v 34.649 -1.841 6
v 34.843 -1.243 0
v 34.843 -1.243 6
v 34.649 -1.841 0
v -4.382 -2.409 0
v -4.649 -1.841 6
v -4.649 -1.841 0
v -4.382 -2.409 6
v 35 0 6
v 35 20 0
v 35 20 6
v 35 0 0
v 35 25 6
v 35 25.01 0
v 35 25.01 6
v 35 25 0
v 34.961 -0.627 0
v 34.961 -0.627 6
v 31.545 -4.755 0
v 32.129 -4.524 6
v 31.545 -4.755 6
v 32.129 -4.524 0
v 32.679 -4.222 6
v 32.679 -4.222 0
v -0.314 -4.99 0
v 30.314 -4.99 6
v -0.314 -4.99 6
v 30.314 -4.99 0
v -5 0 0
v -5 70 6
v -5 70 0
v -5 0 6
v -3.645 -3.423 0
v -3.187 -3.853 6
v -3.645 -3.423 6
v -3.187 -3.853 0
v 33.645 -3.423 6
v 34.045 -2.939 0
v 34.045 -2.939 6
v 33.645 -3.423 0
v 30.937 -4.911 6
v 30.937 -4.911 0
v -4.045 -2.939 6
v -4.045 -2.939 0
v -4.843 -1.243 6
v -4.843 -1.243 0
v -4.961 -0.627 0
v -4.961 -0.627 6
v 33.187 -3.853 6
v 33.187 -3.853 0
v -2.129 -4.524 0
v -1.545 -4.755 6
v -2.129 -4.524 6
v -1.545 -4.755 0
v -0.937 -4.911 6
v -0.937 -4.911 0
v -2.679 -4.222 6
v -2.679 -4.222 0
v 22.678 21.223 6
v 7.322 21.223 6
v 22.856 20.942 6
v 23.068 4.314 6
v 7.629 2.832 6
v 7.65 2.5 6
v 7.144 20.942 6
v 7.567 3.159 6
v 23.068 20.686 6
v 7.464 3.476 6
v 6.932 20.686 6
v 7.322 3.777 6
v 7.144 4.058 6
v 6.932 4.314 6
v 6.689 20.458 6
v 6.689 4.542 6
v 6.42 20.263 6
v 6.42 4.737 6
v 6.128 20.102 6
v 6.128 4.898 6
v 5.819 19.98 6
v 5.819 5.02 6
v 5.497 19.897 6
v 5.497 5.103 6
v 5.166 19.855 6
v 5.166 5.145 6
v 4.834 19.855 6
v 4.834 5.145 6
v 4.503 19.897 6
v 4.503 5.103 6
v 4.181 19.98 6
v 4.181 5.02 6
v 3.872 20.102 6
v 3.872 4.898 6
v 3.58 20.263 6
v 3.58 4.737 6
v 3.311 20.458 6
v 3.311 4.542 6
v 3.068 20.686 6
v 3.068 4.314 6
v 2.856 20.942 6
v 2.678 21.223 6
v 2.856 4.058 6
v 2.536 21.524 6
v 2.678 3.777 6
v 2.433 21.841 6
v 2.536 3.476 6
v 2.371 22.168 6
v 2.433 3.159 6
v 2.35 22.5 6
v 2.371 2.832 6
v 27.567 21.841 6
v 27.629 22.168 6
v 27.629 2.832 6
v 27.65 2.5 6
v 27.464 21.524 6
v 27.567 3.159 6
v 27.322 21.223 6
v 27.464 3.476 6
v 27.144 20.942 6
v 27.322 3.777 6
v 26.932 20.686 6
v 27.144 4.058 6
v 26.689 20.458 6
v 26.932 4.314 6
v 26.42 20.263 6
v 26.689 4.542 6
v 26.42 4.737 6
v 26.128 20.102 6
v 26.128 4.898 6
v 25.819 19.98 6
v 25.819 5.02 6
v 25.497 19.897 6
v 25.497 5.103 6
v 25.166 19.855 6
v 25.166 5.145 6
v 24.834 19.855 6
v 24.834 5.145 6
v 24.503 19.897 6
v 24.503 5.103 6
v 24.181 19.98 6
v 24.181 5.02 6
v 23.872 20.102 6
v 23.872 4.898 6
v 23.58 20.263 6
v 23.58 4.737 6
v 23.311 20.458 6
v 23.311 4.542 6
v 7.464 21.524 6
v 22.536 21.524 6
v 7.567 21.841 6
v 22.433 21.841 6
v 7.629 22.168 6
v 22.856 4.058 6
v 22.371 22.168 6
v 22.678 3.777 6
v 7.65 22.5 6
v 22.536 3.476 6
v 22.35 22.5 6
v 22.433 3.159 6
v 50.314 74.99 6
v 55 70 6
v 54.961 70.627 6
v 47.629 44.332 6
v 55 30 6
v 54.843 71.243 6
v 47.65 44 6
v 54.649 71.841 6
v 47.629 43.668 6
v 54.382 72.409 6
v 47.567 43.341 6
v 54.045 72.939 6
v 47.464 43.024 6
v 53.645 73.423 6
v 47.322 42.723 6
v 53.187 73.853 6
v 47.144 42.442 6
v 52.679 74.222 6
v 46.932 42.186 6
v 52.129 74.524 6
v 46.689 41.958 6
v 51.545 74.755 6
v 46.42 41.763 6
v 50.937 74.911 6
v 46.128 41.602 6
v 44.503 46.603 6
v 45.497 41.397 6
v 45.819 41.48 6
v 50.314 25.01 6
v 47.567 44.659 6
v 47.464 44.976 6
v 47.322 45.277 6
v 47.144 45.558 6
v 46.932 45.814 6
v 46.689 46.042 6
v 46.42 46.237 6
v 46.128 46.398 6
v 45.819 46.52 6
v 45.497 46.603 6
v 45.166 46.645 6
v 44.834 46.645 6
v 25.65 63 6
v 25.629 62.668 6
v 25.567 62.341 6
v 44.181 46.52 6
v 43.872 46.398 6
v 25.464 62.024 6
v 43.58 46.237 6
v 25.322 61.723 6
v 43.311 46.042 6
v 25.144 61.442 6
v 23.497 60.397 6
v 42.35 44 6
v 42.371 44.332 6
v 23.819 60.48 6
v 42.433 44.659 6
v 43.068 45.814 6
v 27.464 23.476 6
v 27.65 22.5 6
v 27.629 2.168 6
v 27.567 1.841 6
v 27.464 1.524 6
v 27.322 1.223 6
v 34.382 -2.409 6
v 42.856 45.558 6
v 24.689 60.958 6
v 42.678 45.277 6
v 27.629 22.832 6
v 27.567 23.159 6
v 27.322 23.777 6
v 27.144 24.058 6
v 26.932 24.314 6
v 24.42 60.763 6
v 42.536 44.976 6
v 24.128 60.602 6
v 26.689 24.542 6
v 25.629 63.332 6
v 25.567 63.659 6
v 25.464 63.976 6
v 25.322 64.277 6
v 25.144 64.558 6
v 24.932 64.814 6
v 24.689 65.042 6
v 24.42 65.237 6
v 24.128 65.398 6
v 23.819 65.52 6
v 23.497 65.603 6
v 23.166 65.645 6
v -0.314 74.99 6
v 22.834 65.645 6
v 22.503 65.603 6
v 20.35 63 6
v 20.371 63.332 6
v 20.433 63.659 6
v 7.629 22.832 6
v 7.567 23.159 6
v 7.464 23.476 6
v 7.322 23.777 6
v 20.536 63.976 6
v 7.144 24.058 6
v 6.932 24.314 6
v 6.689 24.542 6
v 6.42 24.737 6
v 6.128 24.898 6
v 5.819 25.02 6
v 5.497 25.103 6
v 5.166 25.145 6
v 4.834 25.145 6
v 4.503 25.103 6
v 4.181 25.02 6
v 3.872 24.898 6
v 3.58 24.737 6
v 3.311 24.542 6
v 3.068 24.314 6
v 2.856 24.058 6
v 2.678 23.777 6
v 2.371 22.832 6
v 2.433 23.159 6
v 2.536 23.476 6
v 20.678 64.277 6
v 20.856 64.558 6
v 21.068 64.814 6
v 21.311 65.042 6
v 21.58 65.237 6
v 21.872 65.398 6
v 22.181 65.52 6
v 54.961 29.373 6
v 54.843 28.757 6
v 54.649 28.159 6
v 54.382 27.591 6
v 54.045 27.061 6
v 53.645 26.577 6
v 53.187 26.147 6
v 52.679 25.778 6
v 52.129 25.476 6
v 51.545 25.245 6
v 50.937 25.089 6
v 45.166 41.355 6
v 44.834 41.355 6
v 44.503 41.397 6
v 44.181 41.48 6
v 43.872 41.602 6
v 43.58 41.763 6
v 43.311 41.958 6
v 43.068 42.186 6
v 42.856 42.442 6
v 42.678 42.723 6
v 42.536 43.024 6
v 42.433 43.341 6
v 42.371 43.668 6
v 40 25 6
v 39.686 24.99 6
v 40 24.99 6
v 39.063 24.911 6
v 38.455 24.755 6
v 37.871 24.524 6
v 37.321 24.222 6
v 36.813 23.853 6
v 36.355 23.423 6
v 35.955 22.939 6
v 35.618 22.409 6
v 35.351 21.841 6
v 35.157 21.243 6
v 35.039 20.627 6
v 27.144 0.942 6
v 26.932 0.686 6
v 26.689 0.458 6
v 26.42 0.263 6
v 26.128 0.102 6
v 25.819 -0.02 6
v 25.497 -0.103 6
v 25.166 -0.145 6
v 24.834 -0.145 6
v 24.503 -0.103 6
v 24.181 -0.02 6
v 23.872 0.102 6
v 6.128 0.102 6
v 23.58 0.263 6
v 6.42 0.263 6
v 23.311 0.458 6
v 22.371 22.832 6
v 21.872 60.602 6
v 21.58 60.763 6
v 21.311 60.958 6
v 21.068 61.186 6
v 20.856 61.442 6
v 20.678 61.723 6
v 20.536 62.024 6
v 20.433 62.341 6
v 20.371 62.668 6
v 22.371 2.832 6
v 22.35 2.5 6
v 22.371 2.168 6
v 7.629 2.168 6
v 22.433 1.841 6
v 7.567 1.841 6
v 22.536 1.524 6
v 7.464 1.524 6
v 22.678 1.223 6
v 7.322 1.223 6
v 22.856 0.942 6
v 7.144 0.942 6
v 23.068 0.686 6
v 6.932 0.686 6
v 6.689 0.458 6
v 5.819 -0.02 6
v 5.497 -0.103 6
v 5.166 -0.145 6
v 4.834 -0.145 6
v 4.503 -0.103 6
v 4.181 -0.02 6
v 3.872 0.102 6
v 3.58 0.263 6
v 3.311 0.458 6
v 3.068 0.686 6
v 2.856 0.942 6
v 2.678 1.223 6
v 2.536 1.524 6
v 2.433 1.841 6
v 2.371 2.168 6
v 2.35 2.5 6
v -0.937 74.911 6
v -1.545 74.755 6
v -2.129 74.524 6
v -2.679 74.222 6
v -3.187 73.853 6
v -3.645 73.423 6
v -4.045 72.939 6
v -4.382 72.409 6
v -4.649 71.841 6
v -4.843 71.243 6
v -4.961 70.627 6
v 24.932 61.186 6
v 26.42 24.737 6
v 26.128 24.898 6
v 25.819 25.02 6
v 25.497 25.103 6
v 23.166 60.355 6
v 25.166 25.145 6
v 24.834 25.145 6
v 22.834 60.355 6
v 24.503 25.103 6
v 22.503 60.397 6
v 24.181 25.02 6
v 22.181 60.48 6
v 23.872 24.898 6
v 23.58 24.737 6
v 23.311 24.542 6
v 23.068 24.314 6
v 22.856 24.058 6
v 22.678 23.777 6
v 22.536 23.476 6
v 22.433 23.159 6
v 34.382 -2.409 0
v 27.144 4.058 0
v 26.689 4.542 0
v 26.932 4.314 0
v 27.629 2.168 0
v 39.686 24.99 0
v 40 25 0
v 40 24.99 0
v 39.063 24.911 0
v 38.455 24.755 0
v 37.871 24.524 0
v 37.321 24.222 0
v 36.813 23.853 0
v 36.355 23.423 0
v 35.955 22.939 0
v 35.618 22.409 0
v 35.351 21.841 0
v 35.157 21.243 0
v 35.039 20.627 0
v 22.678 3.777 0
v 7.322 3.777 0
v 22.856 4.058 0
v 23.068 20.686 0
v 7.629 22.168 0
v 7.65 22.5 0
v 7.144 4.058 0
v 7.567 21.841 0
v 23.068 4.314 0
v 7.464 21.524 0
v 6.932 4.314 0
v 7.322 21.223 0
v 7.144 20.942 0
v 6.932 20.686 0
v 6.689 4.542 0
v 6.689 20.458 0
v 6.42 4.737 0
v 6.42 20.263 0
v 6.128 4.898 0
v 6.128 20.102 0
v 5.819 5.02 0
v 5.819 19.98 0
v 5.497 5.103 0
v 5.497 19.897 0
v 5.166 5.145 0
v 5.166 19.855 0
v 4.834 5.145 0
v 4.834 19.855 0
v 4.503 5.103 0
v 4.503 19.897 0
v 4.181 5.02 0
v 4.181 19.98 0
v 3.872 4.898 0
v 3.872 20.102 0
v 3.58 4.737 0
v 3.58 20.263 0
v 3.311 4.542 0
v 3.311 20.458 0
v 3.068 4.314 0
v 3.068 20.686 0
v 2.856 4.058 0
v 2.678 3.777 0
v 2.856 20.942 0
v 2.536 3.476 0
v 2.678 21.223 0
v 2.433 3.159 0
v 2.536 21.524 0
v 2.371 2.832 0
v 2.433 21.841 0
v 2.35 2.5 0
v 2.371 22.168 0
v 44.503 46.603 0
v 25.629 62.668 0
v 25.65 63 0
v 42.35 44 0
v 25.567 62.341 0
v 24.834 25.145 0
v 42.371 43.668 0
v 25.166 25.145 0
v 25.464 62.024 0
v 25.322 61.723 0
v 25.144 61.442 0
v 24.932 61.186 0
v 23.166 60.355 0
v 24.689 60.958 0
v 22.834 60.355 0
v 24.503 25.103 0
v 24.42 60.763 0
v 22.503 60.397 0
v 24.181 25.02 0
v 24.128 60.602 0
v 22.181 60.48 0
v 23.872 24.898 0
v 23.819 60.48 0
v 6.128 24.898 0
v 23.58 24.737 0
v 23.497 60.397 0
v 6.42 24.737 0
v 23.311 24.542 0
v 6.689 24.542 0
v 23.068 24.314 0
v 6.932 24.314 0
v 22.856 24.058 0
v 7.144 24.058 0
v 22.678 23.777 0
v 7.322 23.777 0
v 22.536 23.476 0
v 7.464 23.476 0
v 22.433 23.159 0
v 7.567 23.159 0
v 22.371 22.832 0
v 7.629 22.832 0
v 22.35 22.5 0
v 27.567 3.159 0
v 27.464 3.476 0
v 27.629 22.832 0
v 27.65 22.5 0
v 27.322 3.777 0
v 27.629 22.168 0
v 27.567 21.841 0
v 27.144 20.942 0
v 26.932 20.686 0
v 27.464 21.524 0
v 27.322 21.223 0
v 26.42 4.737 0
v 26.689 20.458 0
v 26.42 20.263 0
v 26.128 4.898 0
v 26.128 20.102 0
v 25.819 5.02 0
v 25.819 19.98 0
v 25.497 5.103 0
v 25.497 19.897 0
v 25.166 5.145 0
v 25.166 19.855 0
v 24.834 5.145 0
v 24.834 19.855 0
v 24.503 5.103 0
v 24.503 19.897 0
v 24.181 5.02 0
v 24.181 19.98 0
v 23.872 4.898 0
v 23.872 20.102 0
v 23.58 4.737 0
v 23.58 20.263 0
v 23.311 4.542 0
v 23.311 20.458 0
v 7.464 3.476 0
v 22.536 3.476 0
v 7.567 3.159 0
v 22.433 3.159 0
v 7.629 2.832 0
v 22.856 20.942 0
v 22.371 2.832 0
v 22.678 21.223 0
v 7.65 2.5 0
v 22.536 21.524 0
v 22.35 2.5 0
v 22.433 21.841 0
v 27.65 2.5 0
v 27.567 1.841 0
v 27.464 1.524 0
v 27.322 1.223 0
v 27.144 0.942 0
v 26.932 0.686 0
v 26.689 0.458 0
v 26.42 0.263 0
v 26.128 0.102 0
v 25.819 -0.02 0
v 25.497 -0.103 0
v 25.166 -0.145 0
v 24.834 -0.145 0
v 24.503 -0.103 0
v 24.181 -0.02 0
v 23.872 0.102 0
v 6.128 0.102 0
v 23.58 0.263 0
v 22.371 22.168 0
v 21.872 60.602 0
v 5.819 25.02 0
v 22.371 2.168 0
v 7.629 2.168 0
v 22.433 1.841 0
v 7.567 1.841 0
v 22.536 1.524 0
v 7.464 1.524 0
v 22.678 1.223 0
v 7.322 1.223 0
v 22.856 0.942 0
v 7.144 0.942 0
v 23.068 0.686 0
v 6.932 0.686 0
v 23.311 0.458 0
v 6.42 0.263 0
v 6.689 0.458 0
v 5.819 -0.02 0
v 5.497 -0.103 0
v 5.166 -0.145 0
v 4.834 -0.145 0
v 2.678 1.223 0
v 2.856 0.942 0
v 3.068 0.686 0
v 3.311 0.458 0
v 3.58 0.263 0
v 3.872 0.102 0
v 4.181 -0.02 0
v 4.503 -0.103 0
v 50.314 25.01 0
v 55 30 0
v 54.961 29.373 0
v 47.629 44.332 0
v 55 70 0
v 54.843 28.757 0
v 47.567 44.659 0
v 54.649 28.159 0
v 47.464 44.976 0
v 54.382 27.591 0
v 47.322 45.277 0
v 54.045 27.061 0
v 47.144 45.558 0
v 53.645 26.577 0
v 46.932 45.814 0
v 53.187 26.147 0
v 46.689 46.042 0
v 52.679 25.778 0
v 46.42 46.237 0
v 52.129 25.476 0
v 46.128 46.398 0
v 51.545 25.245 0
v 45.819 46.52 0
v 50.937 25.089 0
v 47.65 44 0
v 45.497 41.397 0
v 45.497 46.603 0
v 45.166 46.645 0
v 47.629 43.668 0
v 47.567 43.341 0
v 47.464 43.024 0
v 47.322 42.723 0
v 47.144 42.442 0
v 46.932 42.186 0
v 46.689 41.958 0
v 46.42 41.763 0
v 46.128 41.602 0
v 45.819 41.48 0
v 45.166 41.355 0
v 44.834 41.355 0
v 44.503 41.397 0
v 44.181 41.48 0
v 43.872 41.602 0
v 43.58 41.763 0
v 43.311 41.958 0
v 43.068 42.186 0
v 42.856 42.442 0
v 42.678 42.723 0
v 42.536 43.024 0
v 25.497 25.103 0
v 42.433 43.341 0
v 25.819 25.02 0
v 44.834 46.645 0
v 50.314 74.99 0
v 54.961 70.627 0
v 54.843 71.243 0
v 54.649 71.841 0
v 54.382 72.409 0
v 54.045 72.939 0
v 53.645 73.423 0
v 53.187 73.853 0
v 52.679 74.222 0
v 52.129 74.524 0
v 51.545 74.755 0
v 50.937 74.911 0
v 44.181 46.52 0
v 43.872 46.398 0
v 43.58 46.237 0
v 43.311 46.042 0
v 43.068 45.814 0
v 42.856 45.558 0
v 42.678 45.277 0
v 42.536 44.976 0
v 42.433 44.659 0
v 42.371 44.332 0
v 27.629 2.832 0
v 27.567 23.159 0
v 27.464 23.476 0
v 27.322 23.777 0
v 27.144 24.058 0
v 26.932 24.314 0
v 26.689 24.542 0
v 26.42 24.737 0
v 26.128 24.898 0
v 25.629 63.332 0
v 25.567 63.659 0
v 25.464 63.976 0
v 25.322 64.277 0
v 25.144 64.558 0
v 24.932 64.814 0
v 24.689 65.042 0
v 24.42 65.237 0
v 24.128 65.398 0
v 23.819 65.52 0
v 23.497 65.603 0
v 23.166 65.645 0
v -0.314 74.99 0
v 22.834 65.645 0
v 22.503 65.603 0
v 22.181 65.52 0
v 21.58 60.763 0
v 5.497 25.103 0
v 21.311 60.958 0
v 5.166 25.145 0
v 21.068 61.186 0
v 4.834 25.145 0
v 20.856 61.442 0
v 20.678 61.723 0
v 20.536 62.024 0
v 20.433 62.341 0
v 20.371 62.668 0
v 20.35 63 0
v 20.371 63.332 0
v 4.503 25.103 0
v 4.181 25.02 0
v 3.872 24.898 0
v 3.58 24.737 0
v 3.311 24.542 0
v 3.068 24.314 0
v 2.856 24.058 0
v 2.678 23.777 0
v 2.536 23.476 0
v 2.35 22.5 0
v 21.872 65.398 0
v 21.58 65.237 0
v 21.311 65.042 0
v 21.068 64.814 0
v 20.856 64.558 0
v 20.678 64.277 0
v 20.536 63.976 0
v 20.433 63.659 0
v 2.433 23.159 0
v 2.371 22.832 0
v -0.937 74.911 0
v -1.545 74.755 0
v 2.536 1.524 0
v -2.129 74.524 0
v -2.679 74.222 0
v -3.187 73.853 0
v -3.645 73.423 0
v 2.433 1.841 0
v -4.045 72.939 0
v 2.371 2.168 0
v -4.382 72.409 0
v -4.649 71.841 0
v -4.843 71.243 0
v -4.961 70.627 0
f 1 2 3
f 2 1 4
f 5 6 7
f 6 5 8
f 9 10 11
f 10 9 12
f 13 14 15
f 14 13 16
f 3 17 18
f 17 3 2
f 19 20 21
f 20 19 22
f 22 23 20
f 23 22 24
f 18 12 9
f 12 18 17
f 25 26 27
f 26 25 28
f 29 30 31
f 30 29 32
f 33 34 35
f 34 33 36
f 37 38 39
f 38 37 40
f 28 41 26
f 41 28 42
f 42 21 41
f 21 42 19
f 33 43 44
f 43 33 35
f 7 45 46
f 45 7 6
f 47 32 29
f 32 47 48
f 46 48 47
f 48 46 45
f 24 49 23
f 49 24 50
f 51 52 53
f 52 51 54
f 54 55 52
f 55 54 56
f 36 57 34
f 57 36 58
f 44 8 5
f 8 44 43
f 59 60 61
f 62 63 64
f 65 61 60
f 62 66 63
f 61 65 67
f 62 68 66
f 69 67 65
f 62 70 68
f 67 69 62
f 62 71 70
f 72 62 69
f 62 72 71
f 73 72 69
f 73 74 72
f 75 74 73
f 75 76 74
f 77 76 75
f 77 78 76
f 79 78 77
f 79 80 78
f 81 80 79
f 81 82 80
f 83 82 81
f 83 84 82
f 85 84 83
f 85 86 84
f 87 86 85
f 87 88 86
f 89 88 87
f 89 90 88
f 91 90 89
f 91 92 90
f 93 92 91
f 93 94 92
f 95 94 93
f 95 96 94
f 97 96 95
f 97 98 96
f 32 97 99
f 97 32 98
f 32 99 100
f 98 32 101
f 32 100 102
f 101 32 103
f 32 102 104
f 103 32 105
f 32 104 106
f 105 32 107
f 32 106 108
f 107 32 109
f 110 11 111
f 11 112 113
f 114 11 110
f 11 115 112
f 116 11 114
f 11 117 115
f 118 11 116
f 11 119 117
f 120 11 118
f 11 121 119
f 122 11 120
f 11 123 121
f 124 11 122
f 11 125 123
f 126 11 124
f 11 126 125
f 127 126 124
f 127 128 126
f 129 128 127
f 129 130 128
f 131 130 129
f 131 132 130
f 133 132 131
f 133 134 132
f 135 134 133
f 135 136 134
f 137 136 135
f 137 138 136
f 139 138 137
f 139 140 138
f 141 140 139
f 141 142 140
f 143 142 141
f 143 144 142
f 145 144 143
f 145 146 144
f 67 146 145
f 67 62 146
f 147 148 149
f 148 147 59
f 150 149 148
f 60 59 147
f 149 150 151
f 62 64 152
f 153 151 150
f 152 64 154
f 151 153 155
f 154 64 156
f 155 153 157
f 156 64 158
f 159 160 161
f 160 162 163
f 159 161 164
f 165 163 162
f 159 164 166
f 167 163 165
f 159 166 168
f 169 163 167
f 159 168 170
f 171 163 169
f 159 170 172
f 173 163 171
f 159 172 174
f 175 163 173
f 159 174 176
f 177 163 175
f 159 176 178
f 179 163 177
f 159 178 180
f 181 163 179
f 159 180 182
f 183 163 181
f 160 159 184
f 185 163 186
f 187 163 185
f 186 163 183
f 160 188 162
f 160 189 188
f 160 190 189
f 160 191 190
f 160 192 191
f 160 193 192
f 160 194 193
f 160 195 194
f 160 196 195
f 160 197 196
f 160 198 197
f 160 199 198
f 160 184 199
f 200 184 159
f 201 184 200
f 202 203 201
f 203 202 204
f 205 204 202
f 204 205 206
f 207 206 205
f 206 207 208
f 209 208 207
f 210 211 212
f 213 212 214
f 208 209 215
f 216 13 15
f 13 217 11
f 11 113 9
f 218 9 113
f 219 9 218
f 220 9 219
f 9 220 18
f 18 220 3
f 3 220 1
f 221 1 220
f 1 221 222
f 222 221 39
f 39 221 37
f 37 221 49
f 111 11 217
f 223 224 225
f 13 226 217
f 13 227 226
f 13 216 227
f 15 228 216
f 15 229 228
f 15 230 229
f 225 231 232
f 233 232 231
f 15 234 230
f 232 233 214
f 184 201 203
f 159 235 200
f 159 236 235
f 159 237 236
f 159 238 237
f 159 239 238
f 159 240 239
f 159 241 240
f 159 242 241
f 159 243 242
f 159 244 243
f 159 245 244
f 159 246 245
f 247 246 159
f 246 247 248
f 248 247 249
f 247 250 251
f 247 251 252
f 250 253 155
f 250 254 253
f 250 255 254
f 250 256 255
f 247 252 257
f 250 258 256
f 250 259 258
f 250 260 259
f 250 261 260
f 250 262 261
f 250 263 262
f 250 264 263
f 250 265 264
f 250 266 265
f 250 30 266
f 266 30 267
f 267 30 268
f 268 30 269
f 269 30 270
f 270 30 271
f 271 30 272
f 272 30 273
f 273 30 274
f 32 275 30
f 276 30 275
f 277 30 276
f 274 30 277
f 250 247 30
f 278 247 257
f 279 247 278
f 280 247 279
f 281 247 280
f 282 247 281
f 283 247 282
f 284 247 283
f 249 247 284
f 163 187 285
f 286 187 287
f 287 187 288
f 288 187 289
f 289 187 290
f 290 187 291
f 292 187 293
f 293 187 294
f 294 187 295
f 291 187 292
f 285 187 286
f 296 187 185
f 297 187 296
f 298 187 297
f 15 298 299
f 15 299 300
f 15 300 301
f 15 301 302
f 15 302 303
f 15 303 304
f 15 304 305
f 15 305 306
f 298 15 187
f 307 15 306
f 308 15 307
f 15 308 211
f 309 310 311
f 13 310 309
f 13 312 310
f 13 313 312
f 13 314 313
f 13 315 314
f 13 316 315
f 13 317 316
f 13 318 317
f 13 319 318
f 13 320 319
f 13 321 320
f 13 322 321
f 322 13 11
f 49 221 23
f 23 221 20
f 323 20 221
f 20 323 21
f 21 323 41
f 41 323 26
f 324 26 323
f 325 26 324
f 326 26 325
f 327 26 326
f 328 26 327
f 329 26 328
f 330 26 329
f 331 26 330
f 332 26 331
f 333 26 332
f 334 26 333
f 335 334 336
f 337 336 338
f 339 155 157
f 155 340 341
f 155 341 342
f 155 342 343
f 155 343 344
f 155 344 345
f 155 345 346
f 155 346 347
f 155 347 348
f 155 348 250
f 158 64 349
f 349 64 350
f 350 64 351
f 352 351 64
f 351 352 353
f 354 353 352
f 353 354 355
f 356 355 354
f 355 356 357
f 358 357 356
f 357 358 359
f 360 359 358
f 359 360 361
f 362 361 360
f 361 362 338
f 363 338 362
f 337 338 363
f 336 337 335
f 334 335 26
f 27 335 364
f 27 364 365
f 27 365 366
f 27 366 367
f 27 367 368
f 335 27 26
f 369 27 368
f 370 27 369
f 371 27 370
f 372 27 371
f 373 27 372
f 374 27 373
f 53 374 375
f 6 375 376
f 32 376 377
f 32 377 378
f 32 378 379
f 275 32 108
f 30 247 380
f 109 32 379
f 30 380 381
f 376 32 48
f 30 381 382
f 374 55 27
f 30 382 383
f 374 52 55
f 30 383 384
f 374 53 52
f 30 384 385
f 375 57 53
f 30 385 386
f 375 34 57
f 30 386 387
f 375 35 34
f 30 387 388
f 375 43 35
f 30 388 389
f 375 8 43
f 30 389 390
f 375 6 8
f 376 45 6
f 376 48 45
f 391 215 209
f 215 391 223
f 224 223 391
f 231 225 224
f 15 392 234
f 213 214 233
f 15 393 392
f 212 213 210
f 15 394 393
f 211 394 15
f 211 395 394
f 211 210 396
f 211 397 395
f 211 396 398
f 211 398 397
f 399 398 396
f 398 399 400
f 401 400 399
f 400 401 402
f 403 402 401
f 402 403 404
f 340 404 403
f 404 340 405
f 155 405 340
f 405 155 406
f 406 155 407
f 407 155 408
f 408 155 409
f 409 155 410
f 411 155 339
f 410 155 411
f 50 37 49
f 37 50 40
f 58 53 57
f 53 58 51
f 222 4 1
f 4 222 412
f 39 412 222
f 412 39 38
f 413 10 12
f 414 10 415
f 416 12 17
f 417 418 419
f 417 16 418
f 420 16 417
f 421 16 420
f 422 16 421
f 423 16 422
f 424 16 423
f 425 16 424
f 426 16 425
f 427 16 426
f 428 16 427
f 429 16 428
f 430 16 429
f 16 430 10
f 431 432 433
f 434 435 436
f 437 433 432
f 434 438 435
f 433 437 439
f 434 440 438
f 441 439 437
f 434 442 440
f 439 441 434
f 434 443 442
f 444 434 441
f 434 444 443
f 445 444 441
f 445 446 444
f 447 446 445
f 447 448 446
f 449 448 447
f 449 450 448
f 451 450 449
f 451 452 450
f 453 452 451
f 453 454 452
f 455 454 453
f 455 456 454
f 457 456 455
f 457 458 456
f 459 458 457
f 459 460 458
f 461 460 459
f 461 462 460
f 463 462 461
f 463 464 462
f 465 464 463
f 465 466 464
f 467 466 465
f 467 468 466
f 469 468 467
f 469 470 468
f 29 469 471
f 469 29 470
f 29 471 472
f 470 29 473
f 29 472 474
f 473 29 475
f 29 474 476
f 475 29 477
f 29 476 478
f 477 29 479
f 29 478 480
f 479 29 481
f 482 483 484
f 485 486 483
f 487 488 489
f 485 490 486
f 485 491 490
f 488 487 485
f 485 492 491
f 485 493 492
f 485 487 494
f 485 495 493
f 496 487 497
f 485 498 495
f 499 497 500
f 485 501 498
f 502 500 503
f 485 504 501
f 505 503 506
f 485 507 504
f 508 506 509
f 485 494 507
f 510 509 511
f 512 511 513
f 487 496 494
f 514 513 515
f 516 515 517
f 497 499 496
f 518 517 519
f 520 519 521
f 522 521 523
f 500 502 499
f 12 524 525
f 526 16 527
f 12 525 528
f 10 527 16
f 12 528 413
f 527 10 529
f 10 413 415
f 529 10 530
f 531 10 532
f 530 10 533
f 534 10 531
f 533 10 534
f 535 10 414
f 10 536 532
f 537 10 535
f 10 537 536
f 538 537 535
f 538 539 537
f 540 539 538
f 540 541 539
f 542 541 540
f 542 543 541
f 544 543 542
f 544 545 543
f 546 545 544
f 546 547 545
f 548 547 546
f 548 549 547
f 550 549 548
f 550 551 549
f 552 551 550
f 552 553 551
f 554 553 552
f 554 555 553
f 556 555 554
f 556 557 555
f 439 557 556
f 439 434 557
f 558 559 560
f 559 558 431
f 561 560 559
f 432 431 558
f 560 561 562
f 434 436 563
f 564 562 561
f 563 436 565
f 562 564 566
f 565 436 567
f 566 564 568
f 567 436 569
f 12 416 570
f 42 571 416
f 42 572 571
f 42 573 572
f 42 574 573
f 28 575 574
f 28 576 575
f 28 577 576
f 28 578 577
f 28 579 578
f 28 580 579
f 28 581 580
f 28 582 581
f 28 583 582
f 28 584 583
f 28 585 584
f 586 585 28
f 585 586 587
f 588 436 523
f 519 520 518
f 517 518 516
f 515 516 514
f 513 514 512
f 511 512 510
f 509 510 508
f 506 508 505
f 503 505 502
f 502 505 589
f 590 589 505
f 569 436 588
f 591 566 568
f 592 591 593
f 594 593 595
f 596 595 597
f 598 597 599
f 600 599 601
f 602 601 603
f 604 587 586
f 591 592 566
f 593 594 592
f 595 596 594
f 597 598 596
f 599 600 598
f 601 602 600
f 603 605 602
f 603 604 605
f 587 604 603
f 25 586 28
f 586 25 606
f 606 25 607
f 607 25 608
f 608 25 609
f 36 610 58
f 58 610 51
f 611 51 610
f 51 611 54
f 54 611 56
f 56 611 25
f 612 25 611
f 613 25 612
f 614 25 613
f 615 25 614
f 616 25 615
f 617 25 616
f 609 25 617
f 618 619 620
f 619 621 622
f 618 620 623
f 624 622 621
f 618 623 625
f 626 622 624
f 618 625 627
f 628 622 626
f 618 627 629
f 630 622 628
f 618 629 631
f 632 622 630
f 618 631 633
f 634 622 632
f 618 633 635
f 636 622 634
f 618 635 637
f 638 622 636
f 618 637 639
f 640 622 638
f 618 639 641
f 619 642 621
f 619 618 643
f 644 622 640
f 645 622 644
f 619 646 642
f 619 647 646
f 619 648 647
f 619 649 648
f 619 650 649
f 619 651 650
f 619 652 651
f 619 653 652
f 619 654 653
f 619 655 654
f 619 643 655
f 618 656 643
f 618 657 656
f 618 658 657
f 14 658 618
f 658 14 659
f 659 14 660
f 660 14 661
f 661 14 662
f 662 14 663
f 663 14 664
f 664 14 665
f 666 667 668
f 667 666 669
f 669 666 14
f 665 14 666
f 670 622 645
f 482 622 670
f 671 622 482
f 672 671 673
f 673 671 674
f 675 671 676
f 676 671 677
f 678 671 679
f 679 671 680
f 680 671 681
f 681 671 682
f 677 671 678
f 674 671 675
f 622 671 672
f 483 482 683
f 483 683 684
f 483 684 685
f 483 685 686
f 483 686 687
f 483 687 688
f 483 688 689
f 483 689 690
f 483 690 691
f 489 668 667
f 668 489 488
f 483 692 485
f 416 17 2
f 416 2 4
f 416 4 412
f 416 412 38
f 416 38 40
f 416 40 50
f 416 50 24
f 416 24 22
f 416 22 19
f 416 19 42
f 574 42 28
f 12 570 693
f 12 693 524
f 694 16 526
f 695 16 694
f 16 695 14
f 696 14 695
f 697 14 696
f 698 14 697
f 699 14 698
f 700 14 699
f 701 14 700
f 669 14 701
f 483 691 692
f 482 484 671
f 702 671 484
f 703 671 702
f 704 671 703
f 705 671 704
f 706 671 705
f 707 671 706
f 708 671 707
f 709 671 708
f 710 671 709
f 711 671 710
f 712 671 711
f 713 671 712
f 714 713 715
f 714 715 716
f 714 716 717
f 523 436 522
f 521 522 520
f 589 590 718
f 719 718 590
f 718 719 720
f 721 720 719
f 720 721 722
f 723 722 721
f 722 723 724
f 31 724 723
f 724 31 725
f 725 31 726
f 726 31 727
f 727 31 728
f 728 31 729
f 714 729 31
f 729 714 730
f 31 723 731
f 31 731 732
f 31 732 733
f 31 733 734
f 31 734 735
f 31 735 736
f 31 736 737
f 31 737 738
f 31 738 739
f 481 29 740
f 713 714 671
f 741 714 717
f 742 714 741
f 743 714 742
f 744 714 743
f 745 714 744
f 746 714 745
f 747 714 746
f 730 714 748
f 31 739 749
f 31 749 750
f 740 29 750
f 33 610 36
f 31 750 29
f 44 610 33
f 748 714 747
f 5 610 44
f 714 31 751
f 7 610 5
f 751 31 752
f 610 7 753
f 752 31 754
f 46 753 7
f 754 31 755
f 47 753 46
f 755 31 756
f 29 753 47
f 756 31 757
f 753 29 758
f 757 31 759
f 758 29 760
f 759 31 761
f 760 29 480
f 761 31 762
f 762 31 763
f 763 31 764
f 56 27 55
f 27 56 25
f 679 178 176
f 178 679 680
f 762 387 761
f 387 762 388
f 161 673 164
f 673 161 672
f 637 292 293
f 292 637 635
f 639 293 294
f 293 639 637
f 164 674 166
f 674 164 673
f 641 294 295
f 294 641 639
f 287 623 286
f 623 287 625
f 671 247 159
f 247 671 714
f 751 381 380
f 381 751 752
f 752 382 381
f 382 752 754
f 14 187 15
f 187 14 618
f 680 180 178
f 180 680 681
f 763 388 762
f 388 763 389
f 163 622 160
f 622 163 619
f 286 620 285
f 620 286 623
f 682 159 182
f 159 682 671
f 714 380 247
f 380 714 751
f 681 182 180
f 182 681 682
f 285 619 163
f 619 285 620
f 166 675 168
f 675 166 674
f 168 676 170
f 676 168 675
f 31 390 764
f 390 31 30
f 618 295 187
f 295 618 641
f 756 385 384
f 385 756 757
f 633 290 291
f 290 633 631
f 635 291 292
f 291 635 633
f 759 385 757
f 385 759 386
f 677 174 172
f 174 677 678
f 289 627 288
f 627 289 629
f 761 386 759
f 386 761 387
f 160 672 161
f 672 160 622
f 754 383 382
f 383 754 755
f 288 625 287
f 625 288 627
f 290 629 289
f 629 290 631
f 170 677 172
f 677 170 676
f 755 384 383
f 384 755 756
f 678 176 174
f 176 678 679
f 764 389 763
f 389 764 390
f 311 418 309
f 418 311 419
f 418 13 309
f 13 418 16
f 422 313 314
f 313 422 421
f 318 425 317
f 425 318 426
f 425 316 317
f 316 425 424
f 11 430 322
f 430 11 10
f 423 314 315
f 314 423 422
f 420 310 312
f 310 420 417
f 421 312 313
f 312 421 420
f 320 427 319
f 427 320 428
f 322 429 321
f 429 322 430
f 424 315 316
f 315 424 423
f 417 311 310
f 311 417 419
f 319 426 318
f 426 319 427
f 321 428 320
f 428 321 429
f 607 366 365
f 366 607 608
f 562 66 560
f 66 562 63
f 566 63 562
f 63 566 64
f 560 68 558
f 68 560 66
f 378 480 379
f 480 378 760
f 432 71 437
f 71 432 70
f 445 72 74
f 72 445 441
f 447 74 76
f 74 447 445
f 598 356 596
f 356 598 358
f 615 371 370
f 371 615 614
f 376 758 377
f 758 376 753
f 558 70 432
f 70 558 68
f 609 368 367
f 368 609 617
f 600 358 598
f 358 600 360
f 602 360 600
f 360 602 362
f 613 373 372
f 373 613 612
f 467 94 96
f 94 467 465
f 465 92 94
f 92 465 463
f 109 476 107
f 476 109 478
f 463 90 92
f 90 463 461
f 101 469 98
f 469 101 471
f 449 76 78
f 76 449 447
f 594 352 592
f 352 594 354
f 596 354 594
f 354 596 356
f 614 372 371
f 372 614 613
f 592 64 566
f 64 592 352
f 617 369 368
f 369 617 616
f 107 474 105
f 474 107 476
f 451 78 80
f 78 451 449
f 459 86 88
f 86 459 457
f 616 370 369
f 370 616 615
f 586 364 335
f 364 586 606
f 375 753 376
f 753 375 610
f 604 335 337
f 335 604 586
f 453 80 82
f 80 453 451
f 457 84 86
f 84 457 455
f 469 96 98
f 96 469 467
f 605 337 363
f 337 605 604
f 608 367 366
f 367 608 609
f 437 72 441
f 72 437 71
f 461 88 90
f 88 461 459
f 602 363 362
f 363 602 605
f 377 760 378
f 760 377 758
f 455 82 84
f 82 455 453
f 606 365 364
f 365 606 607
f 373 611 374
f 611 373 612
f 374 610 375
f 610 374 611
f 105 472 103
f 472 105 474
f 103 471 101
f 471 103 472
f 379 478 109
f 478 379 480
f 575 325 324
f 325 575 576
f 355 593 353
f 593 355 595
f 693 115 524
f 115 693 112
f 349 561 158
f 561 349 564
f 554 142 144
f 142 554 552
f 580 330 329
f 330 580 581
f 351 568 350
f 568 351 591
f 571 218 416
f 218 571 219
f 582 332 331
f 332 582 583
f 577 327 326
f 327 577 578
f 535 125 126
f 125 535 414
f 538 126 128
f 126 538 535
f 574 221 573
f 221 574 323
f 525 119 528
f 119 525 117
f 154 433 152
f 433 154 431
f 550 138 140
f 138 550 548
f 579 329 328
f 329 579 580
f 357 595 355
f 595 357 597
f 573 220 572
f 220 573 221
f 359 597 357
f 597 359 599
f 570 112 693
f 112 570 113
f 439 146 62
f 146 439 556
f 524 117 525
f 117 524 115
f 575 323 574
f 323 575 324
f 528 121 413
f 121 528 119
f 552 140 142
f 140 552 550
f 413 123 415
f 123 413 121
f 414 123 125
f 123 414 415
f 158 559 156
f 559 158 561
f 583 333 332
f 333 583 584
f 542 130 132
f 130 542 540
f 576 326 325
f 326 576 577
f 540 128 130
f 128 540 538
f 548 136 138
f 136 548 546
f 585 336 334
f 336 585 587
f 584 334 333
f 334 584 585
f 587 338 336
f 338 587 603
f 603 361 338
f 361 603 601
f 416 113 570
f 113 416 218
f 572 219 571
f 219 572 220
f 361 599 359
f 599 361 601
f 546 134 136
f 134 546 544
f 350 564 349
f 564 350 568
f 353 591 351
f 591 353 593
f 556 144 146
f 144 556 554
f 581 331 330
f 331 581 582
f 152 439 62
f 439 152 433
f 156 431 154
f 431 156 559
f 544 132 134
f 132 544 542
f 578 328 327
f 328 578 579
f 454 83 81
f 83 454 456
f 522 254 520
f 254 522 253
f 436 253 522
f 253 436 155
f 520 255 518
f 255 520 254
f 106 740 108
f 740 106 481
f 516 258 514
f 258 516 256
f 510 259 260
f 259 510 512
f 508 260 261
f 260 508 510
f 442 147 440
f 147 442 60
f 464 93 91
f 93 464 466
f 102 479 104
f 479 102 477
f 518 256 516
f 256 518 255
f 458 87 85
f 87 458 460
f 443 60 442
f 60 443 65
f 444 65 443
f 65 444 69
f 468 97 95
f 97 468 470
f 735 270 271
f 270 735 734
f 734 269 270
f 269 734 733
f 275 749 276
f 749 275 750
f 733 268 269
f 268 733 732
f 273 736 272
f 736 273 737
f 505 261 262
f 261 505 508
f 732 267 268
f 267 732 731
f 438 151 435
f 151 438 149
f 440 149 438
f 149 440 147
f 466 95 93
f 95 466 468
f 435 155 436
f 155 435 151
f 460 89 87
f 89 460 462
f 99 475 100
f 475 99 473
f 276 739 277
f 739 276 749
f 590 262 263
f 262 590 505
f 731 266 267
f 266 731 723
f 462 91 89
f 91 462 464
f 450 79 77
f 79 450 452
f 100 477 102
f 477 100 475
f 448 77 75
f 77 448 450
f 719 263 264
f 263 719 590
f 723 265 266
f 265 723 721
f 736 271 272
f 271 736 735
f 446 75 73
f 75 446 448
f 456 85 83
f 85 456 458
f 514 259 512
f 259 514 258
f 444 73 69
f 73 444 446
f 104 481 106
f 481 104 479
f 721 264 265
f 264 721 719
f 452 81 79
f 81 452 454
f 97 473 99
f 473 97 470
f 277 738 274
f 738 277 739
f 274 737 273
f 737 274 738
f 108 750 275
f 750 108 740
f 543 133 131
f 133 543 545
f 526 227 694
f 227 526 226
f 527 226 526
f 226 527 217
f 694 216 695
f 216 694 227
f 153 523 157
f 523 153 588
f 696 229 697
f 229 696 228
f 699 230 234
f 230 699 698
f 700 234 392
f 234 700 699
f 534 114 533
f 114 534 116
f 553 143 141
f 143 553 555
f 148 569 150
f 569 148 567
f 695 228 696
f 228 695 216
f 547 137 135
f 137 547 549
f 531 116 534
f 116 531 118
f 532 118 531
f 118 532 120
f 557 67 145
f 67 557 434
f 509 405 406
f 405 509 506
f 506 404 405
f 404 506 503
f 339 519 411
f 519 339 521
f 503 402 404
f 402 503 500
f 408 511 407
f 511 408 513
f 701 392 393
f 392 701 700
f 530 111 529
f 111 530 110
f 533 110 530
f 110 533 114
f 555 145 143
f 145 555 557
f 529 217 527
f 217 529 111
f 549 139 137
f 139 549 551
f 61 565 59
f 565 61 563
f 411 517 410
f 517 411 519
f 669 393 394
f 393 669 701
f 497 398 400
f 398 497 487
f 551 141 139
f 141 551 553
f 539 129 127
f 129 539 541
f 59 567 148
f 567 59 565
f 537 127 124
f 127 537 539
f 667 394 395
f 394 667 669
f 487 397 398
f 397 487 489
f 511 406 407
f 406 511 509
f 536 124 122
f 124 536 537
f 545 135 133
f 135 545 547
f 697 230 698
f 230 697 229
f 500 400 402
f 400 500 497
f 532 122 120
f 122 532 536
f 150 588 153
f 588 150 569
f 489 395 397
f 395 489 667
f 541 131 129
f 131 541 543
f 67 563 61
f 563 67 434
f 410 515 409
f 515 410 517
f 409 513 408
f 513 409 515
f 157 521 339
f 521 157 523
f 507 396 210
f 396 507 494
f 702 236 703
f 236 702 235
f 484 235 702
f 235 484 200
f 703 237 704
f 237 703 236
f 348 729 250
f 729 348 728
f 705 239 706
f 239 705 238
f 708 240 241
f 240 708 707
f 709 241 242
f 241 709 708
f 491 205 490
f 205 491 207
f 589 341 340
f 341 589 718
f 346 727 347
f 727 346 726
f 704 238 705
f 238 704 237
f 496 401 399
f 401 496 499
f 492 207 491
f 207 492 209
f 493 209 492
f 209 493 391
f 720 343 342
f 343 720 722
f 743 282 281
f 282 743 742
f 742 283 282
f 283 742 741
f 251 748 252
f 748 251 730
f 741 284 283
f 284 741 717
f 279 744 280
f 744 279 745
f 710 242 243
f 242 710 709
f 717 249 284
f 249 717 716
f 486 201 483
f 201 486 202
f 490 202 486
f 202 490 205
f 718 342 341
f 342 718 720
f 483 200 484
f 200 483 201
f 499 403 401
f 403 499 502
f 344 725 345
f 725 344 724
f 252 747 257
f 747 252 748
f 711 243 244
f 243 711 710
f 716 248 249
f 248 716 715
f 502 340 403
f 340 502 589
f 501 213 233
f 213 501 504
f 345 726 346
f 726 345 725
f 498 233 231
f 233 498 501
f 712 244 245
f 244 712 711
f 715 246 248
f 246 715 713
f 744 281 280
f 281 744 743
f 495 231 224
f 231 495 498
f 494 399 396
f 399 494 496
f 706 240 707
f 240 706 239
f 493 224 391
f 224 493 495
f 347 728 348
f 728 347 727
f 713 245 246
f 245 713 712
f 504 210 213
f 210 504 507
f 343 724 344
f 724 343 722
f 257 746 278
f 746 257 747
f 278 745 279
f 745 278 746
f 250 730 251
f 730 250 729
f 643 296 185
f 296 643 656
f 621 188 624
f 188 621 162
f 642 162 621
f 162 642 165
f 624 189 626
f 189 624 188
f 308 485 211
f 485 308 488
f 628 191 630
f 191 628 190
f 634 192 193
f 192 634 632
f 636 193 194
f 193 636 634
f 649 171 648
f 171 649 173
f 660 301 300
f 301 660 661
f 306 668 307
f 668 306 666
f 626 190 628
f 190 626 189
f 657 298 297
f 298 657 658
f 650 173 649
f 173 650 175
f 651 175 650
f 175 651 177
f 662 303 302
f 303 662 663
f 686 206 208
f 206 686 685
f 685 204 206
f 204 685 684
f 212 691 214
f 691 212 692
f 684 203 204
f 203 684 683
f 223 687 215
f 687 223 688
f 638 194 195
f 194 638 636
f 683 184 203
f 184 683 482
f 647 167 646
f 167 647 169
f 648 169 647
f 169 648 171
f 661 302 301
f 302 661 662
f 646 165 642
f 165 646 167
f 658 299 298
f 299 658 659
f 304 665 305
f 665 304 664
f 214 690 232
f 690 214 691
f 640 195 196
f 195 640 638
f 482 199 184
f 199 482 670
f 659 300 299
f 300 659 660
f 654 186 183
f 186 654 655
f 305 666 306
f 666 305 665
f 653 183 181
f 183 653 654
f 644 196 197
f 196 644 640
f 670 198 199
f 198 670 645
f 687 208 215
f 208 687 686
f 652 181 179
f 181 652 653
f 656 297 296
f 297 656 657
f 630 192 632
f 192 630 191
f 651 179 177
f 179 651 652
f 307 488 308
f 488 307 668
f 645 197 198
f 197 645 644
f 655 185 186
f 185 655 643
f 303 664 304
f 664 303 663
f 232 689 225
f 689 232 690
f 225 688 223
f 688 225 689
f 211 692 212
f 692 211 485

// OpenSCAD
$fn=50;
$drill=5.3;
$thickness=6;
difference() {
    union() {
        hull() {
            translate([0,0,0]) cylinder(r=5, h=$thickness);
            translate([0,30,0]) cylinder(r=5, h=$thickness);
            translate([30,0,0]) cylinder(r=5, h=$thickness);
            translate([30,30,0]) cylinder(r=5, h=$thickness);
        }
        hull() {
            translate([0,30,0]) cylinder(r=5, h=$thickness);
            translate([0,70,0]) cylinder(r=5, h=$thickness);
            translate([50,30,0]) cylinder(r=5, h=$thickness);
            translate([50,70,0]) cylinder(r=5, h=$thickness);
        }
        translate([35,20,0]) cube([5,5,$thickness]);
    }
    translate([40,20,-1]) cylinder(r=5,h=$thickness+2);
    translate([5,2.5,-1]) cylinder(r=$drill/2,h=$thickness+2);
    translate([25,2.5,-1]) cylinder(r=$drill/2,h=$thickness+2);
    translate([5,22.5,-1]) cylinder(r=$drill/2,h=$thickness+2);
    translate([25,22.5,-1]) cylinder(r=$drill/2,h=$thickness+2);

    translate([23,63,-1]) cylinder(r=$drill/2,h=$thickness+2);
    translate([45,44,-1]) cylinder(r=$drill/2,h=$thickness+2);
}
